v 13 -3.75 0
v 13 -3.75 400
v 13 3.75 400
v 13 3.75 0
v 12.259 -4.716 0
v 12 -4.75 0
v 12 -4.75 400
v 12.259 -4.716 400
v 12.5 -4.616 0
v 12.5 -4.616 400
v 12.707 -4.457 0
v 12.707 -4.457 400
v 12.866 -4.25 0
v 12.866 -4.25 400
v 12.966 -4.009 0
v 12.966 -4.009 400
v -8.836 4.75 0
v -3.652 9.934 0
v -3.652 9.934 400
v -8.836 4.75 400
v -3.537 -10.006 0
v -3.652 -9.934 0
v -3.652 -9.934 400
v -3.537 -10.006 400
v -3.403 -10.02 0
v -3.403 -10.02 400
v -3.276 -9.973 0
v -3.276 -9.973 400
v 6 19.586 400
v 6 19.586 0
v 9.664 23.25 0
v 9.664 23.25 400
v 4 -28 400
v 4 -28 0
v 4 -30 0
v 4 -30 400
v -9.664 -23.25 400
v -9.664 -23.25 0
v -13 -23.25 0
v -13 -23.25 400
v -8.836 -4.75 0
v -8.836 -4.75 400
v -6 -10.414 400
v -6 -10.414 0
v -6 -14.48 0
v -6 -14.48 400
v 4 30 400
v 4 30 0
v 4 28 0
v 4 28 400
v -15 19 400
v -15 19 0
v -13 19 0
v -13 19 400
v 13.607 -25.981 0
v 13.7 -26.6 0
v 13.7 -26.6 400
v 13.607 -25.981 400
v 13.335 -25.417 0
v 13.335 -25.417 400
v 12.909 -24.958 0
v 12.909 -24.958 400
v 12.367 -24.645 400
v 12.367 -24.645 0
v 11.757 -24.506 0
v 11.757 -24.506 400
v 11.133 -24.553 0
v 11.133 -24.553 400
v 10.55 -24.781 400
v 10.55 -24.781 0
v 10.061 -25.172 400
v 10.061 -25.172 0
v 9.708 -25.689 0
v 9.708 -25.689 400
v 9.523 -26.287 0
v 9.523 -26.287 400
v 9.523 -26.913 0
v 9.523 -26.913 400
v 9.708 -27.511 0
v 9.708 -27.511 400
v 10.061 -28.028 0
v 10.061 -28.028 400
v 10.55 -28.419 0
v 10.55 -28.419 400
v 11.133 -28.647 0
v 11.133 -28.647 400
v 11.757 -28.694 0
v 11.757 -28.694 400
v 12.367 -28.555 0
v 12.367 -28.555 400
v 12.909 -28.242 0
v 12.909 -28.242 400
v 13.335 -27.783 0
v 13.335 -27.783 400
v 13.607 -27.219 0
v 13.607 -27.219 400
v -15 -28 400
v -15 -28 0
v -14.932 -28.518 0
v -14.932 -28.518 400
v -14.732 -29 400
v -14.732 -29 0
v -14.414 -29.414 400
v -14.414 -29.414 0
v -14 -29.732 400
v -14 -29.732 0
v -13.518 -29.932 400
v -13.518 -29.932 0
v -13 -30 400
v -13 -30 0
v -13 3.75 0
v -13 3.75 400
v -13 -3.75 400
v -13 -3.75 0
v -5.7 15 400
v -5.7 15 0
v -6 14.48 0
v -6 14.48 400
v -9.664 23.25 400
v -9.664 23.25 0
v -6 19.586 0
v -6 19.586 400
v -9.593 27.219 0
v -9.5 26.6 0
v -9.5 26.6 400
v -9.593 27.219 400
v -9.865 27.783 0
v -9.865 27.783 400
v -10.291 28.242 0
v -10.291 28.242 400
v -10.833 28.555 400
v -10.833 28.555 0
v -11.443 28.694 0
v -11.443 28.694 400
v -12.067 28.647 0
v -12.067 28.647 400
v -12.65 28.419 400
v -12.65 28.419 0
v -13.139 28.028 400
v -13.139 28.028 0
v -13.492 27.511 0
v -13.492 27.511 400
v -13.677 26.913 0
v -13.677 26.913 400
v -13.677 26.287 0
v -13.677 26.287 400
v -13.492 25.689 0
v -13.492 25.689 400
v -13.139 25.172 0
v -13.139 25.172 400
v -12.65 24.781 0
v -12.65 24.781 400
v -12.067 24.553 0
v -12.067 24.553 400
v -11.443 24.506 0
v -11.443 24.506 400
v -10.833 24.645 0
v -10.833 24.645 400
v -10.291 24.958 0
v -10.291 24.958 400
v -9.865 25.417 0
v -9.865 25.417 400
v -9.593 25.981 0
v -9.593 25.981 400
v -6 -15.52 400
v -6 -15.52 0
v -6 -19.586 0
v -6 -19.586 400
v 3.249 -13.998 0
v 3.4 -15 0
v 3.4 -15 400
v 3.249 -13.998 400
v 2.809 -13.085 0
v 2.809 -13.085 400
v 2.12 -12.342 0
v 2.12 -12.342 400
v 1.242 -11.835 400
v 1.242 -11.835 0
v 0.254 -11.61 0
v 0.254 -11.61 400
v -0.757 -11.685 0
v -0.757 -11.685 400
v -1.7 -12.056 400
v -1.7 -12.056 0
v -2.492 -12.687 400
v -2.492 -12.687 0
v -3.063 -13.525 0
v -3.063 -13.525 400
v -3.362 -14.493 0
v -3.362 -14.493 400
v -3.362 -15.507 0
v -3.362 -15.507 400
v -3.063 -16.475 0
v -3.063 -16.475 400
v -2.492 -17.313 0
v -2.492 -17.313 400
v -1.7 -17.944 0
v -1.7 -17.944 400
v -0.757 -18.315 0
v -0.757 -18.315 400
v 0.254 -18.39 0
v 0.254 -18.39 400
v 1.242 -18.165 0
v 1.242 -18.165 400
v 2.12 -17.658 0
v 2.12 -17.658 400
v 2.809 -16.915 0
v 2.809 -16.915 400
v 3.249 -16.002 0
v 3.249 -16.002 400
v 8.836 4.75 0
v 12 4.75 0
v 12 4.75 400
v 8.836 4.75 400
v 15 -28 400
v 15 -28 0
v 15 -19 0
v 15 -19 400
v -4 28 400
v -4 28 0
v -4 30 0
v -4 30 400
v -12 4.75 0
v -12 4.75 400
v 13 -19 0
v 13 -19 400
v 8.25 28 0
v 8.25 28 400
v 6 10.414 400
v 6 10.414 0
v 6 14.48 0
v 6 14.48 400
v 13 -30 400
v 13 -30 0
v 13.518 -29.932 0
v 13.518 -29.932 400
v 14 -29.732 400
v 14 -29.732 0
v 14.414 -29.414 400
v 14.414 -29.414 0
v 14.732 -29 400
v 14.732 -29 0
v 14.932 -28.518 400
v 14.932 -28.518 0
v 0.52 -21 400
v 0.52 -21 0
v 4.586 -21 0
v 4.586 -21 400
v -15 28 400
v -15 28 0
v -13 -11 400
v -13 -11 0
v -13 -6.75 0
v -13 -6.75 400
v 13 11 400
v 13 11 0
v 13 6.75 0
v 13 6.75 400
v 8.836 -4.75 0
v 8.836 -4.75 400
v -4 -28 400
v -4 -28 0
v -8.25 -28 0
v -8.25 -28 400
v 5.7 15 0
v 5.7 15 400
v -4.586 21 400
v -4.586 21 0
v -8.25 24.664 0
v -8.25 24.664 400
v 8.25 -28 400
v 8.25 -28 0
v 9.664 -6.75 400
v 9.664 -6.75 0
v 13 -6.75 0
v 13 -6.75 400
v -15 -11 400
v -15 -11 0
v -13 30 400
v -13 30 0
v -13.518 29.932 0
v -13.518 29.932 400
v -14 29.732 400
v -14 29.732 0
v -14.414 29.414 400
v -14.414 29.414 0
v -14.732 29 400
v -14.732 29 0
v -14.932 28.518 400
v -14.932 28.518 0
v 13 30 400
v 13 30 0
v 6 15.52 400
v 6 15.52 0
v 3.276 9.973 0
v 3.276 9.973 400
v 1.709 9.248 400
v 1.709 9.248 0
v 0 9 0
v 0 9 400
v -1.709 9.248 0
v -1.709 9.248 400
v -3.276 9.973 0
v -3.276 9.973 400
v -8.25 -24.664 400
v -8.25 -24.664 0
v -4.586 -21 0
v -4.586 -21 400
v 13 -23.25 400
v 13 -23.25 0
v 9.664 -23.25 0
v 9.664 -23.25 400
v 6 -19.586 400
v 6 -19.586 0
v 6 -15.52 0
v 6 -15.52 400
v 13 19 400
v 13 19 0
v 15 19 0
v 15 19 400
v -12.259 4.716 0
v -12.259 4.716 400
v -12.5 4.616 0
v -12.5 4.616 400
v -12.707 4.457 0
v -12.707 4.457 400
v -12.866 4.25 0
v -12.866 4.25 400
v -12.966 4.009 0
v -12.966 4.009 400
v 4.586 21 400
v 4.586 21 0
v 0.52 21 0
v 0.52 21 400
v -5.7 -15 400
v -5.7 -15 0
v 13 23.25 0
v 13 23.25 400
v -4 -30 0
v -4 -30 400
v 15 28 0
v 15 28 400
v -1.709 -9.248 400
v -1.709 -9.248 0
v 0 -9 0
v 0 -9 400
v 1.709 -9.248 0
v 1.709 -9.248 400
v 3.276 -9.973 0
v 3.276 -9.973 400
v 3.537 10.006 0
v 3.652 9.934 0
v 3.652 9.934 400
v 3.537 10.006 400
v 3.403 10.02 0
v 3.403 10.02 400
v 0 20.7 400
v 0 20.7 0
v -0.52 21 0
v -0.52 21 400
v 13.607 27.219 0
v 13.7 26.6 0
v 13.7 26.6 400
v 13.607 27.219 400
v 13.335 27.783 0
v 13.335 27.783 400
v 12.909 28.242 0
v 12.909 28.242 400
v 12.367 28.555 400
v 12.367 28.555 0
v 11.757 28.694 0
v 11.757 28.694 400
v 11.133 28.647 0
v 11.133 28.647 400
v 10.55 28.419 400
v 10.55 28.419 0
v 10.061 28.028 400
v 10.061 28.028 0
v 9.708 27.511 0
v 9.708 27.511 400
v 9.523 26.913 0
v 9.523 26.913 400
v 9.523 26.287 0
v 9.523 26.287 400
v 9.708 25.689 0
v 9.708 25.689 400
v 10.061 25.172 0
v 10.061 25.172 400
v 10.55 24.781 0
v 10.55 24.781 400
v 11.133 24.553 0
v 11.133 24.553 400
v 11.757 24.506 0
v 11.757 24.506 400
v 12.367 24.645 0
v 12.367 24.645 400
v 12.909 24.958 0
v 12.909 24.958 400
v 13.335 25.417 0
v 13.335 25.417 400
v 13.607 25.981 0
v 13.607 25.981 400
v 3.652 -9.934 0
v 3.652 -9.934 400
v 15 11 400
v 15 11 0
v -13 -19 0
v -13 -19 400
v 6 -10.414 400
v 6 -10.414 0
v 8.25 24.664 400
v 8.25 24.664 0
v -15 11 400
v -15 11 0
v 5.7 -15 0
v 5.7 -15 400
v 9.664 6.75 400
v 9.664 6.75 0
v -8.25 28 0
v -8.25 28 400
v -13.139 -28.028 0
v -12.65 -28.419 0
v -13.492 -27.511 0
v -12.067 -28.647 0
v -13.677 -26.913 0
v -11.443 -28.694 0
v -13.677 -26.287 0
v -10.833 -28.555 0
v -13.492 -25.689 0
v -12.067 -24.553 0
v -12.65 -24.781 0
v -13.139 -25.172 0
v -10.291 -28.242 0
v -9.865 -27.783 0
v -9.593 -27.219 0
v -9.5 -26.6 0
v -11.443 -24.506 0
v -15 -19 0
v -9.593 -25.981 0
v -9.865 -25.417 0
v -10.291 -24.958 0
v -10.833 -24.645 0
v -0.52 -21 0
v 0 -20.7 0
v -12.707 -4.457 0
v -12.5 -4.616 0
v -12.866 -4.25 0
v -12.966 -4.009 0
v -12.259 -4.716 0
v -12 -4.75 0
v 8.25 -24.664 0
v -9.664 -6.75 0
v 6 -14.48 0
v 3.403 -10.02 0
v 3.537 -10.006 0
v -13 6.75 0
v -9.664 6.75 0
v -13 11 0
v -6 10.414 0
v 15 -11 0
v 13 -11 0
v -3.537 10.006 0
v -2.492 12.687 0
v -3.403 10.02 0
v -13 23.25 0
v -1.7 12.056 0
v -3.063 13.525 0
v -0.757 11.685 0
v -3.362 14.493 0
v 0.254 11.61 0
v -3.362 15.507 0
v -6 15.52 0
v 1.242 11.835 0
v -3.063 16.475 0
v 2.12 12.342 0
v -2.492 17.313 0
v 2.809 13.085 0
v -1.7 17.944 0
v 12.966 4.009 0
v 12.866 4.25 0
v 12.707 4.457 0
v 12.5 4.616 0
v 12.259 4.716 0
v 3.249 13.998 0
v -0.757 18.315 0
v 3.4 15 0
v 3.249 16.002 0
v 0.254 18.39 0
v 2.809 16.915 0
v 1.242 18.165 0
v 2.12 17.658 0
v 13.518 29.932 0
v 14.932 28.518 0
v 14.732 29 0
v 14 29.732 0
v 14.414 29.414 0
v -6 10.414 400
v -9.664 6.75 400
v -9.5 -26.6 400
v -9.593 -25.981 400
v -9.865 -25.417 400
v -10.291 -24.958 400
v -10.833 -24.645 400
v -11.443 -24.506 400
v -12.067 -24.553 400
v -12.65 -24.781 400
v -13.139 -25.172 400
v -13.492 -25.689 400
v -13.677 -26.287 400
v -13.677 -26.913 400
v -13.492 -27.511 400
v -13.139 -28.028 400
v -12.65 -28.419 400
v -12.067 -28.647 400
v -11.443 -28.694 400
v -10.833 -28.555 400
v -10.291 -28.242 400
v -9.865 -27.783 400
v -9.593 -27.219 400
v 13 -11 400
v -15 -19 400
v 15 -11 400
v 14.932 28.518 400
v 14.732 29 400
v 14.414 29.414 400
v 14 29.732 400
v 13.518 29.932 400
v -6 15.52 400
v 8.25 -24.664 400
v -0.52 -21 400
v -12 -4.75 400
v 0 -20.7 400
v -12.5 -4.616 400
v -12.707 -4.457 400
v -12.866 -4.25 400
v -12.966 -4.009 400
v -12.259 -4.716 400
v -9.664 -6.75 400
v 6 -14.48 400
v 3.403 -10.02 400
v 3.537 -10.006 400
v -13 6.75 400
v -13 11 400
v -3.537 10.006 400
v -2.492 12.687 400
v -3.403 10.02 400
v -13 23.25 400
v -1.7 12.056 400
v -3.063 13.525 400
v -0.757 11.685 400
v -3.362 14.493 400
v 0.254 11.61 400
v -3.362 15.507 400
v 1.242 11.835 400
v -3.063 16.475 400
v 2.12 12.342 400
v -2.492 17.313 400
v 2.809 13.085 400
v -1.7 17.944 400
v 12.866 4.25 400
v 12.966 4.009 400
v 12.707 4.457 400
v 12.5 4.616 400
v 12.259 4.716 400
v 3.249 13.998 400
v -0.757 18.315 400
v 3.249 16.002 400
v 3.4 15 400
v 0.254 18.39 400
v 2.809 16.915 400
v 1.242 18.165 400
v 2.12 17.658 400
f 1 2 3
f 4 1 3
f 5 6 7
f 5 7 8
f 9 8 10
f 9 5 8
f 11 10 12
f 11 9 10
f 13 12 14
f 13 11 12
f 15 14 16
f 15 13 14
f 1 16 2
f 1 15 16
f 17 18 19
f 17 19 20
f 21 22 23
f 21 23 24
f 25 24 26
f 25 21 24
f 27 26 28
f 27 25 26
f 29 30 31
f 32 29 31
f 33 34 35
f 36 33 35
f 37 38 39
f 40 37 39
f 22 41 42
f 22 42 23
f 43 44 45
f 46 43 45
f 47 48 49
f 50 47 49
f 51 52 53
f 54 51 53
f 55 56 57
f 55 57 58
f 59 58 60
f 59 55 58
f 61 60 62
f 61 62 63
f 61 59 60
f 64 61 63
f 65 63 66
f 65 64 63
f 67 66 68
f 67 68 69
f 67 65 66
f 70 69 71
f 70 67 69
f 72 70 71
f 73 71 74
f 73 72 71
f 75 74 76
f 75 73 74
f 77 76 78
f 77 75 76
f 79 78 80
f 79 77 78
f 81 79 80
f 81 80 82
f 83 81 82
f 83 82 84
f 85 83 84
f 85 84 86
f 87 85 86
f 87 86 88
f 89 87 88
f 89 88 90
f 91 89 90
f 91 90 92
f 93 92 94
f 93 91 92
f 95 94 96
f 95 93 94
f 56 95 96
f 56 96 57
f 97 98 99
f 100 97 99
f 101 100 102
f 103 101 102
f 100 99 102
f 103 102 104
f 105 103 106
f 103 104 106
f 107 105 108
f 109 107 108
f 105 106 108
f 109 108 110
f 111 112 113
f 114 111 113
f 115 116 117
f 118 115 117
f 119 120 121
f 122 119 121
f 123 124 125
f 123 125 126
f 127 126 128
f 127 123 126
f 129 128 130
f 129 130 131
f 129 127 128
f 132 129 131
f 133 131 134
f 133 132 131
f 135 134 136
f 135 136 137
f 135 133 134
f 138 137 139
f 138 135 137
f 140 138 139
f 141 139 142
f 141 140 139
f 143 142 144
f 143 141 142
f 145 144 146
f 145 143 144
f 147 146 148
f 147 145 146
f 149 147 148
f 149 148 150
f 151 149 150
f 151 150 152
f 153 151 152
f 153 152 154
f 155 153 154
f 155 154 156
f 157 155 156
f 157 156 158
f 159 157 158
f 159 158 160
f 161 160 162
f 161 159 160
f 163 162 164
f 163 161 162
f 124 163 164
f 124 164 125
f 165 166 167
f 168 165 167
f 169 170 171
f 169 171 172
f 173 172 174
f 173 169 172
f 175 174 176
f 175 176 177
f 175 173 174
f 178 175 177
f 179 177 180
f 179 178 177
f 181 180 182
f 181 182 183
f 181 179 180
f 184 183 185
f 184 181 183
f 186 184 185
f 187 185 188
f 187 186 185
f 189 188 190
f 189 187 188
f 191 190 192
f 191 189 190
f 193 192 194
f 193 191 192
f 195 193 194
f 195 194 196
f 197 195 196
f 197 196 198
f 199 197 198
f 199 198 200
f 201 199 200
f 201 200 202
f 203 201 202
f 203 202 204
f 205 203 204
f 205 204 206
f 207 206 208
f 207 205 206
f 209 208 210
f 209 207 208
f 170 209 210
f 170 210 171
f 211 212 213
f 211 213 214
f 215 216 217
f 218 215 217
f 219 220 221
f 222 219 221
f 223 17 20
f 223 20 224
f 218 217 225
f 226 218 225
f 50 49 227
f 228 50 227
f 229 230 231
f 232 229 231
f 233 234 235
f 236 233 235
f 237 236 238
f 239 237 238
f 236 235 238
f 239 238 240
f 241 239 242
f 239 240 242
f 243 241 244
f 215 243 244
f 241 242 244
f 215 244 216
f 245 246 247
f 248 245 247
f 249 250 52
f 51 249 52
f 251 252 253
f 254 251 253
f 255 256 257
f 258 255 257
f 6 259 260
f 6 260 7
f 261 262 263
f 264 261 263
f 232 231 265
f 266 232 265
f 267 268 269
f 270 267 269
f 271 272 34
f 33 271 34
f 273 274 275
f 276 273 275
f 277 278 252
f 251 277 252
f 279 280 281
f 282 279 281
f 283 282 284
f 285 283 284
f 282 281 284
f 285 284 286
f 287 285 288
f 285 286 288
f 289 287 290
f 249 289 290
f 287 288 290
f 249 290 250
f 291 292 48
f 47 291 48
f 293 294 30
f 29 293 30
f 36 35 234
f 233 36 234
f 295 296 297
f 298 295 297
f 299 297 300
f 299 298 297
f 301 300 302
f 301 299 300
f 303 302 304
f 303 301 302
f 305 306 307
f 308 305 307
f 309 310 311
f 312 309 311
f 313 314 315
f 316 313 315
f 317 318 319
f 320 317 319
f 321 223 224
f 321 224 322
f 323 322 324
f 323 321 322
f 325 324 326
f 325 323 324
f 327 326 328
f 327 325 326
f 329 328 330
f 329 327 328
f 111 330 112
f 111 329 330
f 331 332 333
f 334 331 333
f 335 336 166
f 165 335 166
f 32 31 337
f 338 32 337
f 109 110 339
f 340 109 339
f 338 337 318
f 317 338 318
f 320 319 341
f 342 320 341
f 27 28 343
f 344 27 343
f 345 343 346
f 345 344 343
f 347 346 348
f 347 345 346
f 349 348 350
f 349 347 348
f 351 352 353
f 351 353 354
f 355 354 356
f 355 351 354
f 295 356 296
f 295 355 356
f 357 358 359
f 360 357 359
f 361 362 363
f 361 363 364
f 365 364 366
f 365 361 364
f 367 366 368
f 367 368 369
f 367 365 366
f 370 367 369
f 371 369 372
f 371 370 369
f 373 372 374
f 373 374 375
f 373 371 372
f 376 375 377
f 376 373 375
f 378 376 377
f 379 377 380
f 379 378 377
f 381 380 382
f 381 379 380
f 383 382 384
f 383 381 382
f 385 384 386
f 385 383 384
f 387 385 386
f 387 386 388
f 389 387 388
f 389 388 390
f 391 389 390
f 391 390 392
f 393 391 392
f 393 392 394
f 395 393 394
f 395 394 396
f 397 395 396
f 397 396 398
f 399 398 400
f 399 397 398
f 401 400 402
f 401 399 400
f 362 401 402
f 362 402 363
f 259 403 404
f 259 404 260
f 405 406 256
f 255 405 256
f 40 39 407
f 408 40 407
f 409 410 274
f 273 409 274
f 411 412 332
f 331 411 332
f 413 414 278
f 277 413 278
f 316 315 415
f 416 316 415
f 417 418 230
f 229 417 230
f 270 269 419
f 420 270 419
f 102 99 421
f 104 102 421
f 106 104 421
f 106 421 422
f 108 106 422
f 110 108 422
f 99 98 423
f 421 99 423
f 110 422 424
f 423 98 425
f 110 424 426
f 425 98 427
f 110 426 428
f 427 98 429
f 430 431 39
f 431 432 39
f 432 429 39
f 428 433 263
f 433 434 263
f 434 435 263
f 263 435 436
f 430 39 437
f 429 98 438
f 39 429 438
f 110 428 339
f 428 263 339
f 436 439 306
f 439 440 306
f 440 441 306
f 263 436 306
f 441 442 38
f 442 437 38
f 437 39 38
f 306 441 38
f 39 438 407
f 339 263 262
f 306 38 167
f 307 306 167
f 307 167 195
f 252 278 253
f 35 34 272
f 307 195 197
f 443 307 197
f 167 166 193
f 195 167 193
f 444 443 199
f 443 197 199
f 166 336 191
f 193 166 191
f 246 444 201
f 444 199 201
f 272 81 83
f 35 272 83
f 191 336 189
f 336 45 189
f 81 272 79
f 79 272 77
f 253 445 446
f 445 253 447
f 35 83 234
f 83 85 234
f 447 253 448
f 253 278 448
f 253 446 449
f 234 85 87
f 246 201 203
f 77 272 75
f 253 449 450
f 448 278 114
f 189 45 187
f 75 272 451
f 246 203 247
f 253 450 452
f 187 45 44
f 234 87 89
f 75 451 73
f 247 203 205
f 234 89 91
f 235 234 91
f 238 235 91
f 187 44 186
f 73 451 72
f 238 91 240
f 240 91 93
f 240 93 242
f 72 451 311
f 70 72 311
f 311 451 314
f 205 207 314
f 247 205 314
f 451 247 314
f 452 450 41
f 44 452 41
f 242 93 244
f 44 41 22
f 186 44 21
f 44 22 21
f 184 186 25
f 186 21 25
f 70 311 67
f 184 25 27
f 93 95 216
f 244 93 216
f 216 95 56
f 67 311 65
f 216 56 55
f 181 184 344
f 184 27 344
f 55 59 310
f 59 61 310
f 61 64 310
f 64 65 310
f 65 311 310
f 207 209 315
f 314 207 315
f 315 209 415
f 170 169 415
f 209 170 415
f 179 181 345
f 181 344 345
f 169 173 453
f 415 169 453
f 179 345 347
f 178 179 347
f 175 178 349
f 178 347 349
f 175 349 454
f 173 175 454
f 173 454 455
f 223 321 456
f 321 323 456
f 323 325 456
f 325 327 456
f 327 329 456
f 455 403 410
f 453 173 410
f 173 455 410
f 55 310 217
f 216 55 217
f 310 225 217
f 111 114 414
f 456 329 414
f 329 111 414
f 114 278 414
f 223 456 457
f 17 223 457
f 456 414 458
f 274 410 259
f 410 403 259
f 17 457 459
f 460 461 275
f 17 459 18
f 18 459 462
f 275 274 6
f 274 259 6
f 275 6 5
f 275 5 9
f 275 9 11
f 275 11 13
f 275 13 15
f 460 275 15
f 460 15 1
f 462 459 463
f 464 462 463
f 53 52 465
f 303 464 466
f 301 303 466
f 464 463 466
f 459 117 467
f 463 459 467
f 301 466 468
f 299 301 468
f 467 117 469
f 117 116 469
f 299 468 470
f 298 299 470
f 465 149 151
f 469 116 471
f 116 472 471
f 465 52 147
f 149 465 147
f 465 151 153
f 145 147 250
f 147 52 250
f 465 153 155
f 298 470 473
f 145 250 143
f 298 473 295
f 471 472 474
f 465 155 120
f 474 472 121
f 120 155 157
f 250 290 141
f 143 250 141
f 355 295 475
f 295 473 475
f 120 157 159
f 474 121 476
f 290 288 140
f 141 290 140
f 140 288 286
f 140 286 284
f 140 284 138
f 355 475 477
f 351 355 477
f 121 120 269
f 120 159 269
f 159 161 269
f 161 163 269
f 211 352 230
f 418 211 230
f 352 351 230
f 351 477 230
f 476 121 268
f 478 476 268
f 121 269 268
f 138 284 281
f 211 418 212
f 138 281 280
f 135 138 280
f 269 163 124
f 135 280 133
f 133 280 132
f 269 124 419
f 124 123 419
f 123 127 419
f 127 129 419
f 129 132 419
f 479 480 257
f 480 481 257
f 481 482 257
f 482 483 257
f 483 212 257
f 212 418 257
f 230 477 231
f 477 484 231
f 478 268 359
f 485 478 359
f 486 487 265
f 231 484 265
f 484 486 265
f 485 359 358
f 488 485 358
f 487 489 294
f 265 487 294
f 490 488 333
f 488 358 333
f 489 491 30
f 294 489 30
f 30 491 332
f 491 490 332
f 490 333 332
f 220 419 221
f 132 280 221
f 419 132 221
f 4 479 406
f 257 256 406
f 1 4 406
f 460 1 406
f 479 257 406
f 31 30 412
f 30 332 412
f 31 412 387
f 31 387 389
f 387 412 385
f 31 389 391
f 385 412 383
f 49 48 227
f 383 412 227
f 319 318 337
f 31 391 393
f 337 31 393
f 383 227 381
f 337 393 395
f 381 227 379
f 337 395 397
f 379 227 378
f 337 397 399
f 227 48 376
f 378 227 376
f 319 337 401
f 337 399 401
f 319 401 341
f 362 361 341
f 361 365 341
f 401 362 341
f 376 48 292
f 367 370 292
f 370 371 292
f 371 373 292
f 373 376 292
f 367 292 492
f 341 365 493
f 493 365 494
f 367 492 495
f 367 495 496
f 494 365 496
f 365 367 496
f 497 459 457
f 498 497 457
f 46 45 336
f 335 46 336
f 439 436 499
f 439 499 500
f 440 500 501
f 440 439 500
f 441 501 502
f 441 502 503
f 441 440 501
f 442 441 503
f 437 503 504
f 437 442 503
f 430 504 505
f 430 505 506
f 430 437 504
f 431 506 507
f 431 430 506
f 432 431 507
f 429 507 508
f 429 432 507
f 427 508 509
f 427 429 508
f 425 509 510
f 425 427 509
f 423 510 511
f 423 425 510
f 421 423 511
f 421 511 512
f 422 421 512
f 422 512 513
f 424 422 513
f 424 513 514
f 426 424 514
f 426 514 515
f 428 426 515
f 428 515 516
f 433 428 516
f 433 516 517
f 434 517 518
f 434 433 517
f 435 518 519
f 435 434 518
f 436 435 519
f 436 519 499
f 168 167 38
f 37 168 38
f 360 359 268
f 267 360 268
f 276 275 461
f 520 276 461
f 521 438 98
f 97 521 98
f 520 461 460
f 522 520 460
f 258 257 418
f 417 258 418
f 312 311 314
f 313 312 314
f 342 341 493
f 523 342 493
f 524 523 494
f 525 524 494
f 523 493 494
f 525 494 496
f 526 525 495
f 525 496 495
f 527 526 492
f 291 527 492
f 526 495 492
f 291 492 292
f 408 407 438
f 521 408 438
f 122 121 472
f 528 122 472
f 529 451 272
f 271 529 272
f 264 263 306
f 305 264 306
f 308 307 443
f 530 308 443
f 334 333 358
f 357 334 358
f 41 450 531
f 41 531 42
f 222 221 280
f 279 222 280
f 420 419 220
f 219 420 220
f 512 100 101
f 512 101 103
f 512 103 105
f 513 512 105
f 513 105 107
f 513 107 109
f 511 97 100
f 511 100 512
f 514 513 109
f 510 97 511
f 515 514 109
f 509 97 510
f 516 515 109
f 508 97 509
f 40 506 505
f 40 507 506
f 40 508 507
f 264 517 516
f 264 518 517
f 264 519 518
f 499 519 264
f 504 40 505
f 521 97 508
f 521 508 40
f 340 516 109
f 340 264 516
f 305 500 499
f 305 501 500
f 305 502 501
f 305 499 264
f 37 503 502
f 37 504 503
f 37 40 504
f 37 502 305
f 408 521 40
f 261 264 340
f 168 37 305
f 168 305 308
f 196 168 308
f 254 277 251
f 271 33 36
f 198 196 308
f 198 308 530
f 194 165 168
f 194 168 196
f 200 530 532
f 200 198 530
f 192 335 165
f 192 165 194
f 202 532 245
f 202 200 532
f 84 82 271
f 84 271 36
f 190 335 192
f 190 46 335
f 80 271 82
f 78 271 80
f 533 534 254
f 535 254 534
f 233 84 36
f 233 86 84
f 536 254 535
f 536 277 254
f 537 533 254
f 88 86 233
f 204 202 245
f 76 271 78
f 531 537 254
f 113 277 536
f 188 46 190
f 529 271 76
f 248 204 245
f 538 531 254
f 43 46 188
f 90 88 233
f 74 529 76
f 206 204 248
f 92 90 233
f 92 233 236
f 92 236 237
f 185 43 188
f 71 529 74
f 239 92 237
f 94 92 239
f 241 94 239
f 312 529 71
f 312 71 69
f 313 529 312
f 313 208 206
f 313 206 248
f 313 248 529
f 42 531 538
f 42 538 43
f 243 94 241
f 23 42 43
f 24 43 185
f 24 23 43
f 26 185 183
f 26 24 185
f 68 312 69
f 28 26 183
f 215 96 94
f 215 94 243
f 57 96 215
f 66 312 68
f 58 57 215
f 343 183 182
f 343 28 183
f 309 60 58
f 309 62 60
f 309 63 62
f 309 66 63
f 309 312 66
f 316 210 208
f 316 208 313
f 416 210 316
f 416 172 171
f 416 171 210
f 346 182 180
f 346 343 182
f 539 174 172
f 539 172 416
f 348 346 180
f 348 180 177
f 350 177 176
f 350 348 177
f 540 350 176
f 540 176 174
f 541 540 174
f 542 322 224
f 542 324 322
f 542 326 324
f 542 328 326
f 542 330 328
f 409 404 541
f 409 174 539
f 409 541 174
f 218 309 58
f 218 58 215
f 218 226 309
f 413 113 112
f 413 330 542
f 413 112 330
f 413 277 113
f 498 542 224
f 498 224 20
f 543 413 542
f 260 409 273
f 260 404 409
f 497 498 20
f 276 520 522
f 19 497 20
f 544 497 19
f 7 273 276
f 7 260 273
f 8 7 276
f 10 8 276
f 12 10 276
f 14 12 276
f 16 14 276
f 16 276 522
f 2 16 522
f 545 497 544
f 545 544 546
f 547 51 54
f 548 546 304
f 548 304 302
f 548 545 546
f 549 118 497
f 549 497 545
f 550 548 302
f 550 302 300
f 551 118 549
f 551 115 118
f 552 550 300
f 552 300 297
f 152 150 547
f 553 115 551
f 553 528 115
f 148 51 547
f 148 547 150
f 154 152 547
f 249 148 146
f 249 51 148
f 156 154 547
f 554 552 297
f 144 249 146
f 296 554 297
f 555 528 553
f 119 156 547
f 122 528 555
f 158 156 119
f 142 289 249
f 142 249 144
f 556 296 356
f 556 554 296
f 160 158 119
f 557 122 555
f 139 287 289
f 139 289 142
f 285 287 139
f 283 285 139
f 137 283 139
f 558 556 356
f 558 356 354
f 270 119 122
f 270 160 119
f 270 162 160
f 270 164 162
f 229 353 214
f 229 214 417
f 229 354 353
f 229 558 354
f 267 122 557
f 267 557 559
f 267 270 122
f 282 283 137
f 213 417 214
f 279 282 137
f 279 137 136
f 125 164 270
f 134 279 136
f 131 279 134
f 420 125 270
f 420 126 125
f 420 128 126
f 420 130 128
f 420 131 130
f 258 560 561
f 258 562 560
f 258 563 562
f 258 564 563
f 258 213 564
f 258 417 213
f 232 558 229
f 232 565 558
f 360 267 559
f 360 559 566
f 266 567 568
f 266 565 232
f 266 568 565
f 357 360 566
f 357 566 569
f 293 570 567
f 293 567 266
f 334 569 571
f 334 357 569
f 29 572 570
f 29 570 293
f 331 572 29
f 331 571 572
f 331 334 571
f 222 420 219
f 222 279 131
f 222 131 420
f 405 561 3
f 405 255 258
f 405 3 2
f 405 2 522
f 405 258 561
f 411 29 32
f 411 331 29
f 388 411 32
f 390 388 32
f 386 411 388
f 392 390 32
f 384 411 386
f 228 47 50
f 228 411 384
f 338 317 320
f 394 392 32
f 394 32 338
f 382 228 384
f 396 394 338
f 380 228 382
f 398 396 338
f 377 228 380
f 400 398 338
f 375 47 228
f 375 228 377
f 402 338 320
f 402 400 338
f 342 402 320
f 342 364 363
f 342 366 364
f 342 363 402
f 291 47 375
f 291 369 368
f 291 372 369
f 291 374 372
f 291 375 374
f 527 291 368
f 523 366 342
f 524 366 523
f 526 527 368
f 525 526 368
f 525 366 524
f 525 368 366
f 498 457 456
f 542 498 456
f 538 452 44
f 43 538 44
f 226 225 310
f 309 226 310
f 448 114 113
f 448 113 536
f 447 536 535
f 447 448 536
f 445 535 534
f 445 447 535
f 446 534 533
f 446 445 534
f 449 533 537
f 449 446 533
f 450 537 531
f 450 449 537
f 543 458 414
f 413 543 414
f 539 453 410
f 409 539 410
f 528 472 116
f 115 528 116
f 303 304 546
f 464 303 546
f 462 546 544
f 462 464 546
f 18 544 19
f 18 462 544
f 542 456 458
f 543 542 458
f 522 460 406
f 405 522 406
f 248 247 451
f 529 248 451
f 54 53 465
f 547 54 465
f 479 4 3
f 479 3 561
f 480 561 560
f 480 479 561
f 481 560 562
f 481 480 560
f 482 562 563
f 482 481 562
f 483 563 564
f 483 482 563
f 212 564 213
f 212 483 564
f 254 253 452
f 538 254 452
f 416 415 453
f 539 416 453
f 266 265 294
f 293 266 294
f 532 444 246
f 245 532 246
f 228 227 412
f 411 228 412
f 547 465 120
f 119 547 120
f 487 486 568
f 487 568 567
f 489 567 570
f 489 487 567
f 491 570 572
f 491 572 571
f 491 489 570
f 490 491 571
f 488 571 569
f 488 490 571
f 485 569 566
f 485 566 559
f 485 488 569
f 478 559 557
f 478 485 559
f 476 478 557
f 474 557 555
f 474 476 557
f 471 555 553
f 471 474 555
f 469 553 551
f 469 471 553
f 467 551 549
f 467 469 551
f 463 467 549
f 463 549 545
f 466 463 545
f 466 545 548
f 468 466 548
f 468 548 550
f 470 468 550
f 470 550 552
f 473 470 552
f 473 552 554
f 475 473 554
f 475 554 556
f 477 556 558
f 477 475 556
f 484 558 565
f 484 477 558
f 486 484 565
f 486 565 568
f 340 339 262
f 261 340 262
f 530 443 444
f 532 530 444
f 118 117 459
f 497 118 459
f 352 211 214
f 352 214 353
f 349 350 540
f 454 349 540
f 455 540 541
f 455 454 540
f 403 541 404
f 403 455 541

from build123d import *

# Parameters (mm, degrees)
MODEL_R             = 2.1
MODEL_R_2           = 3.4
BOSS_EXTRUDE1_DEPTH = 400


with BuildPart() as part:
    # Model → Boss-Extrude1 (new body)
    with BuildSketch(Plane.XY):
        with BuildLine():
            Line((13, -11), (15, -11))
            Line((15, -11), (15, 11))
            Line((15, 11), (13, 11))
            Line((13, 11), (13, 6.75))
            Line((13, 6.75), (9.664213562, 6.75))
            Line((9.664213562, 6.75), (6, 10.414213562))
            Line((6, 10.414213562), (6, 14.480384758))
            Line((6, 14.480384758), (5.7, 15))
            Line((5.7, 15), (6, 15.519615242))
            Line((6, 15.519615242), (6, 19.585786438))
            Line((6, 19.585786438), (9.664213562, 23.25))
            Line((9.664213562, 23.25), (13, 23.25))
            Line((13, 23.25), (13, 19))
            Line((13, 19), (15, 19))
            Line((15, 19), (15, 28))
            ThreePointArc((15, 28), (14.414213562, 29.414213562), (13, 30))
            Line((13, 30), (4, 30))
            Line((4, 30), (4, 28))
            Line((4, 28), (8.25, 28))
            Line((8.25, 28), (8.25, 24.664213562))
            Line((8.25, 24.664213562), (4.585786438, 21))
            Line((4.585786438, 21), (0.519615242, 21))
            Line((0.519615242, 21), (0, 20.7))
            Line((0, 20.7), (-0.519615242, 21))
            Line((-0.519615242, 21), (-4.585786438, 21))
            Line((-4.585786438, 21), (-8.25, 24.664213562))
            Line((-8.25, 24.664213562), (-8.25, 28))
            Line((-8.25, 28), (-4, 28))
            Line((-4, 28), (-4, 30))
            Line((-4, 30), (-13, 30))
            ThreePointArc((-13, 30), (-14.414213562, 29.414213562), (-15, 28))
            Line((-15, 28), (-15, 19))
            Line((-15, 19), (-13, 19))
            Line((-13, 19), (-13, 23.25))
            Line((-13, 23.25), (-9.664213562, 23.25))
            Line((-9.664213562, 23.25), (-6, 19.585786438))
            Line((-6, 19.585786438), (-6, 15.519615242))
            Line((-6, 15.519615242), (-5.7, 15))
            Line((-5.7, 15), (-6, 14.480384758))
            Line((-6, 14.480384758), (-6, 10.414213562))
            Line((-6, 10.414213562), (-9.664213562, 6.75))
            Line((-9.664213562, 6.75), (-13, 6.75))
            Line((-13, 6.75), (-13, 11))
            Line((-13, 11), (-15, 11))
            Line((-15, 11), (-15, -11))
            Line((-15, -11), (-13, -11))
            Line((-13, -11), (-13, -6.75))
            Line((-13, -6.75), (-9.664213562, -6.75))
            Line((-9.664213562, -6.75), (-6, -10.414213562))
            Line((-6, -10.414213562), (-6, -14.480384758))
            Line((-6, -14.480384758), (-5.7, -15))
            Line((-5.7, -15), (-6, -15.519615242))
            Line((-6, -15.519615242), (-6, -19.585786438))
            Line((-6, -19.585786438), (-9.664213562, -23.25))
            Line((-9.664213562, -23.25), (-13, -23.25))
            Line((-13, -23.25), (-13, -19))
            Line((-13, -19), (-15, -19))
            Line((-15, -19), (-15, -28))
            ThreePointArc((-15, -28), (-14.414213562, -29.414213562), (-13, -30))
            Line((-13, -30), (-4, -30))
            Line((-4, -30), (-4, -28))
            Line((-4, -28), (-8.25, -28))
            Line((-8.25, -28), (-8.25, -24.664213562))
            Line((-8.25, -24.664213562), (-4.585786438, -21))
            Line((-4.585786438, -21), (-0.519615242, -21))
            Line((-0.519615242, -21), (0, -20.7))
            Line((0, -20.7), (0.519615242, -21))
            Line((0.519615242, -21), (4.585786438, -21))
            Line((4.585786438, -21), (8.25, -24.664213562))
            Line((8.25, -24.664213562), (8.25, -28))
            Line((8.25, -28), (4, -28))
            Line((4, -28), (4, -30))
            Line((4, -30), (13, -30))
            ThreePointArc((13, -30), (14.414213562, -29.414213562), (15, -28))
            Line((15, -28), (15, -19))
            Line((15, -19), (13, -19))
            Line((13, -19), (13, -23.25))
            Line((13, -23.25), (9.664213562, -23.25))
            Line((9.664213562, -23.25), (6, -19.585786438))
            Line((6, -19.585786438), (6, -15.519615242))
            Line((6, -15.519615242), (5.7, -15))
            Line((5.7, -15), (6, -14.480384758))
            Line((6, -14.480384758), (6, -10.414213562))
            Line((6, -10.414213562), (9.664213562, -6.75))
            Line((9.664213562, -6.75), (13, -6.75))
            Line((13, -6.75), (13, -11))
        make_face()
        with Locations((11.6, -26.6)):
            Circle(MODEL_R, mode=Mode.SUBTRACT)
        with Locations((11.6, 26.6)):
            Circle(MODEL_R, mode=Mode.SUBTRACT)
        with Locations((0, 15)):
            Circle(MODEL_R_2, mode=Mode.SUBTRACT)
        with Locations((0, -15)):
            Circle(MODEL_R_2, mode=Mode.SUBTRACT)
        with Locations((-11.6, 26.6)):
            Circle(MODEL_R, mode=Mode.SUBTRACT)
        with Locations((-11.6, -26.6)):
            Circle(MODEL_R, mode=Mode.SUBTRACT)
        with BuildLine():
            Line((-8.835786438, 4.75), (-12, 4.75))
            ThreePointArc((-12, 4.75), (-12.707106781, 4.457106781), (-13, 3.75))
            Line((-13, 3.75), (-13, -3.75))
            ThreePointArc((-13, -3.75), (-12.707106781, -4.457106781), (-12, -4.75))
            Line((-12, -4.75), (-8.835786438, -4.75))
            Line((-8.835786438, -4.75), (-3.651792162, -9.933994275))
            ThreePointArc((-3.651792162, -9.933994275), (-3.470780421, -10.020243754), (-3.275866822, -9.973202156))
            ThreePointArc((-3.275866822, -9.973202156), (-2e-08, -9), (3.275866789, -9.973202134))
            ThreePointArc((3.275866789, -9.973202134), (3.470780401, -10.020243756), (3.651792162, -9.933994275))
            Line((3.651792162, -9.933994275), (8.835786438, -4.75))
            Line((8.835786438, -4.75), (12, -4.75))
            ThreePointArc((12, -4.75), (12.707106781, -4.457106781), (13, -3.75))
            Line((13, -3.75), (13, 3.75))
            ThreePointArc((13, 3.75), (12.707106781, 4.457106781), (12, 4.75))
            Line((12, 4.75), (8.835786438, 4.75))
            Line((8.835786438, 4.75), (3.651792162, 9.933994275))
            ThreePointArc((3.651792162, 9.933994275), (3.470780421, 10.020243754), (3.275866822, 9.973202156))
            ThreePointArc((3.275866822, 9.973202156), (2e-08, 9), (-3.275866789, 9.973202134))
            ThreePointArc((-3.275866789, 9.973202134), (-3.470780401, 10.020243756), (-3.651792162, 9.933994275))
            Line((-3.651792162, 9.933994275), (-8.835786438, 4.75))
        make_face(mode=Mode.SUBTRACT)
    extrude(amount=BOSS_EXTRUDE1_DEPTH)


solid = part.part
